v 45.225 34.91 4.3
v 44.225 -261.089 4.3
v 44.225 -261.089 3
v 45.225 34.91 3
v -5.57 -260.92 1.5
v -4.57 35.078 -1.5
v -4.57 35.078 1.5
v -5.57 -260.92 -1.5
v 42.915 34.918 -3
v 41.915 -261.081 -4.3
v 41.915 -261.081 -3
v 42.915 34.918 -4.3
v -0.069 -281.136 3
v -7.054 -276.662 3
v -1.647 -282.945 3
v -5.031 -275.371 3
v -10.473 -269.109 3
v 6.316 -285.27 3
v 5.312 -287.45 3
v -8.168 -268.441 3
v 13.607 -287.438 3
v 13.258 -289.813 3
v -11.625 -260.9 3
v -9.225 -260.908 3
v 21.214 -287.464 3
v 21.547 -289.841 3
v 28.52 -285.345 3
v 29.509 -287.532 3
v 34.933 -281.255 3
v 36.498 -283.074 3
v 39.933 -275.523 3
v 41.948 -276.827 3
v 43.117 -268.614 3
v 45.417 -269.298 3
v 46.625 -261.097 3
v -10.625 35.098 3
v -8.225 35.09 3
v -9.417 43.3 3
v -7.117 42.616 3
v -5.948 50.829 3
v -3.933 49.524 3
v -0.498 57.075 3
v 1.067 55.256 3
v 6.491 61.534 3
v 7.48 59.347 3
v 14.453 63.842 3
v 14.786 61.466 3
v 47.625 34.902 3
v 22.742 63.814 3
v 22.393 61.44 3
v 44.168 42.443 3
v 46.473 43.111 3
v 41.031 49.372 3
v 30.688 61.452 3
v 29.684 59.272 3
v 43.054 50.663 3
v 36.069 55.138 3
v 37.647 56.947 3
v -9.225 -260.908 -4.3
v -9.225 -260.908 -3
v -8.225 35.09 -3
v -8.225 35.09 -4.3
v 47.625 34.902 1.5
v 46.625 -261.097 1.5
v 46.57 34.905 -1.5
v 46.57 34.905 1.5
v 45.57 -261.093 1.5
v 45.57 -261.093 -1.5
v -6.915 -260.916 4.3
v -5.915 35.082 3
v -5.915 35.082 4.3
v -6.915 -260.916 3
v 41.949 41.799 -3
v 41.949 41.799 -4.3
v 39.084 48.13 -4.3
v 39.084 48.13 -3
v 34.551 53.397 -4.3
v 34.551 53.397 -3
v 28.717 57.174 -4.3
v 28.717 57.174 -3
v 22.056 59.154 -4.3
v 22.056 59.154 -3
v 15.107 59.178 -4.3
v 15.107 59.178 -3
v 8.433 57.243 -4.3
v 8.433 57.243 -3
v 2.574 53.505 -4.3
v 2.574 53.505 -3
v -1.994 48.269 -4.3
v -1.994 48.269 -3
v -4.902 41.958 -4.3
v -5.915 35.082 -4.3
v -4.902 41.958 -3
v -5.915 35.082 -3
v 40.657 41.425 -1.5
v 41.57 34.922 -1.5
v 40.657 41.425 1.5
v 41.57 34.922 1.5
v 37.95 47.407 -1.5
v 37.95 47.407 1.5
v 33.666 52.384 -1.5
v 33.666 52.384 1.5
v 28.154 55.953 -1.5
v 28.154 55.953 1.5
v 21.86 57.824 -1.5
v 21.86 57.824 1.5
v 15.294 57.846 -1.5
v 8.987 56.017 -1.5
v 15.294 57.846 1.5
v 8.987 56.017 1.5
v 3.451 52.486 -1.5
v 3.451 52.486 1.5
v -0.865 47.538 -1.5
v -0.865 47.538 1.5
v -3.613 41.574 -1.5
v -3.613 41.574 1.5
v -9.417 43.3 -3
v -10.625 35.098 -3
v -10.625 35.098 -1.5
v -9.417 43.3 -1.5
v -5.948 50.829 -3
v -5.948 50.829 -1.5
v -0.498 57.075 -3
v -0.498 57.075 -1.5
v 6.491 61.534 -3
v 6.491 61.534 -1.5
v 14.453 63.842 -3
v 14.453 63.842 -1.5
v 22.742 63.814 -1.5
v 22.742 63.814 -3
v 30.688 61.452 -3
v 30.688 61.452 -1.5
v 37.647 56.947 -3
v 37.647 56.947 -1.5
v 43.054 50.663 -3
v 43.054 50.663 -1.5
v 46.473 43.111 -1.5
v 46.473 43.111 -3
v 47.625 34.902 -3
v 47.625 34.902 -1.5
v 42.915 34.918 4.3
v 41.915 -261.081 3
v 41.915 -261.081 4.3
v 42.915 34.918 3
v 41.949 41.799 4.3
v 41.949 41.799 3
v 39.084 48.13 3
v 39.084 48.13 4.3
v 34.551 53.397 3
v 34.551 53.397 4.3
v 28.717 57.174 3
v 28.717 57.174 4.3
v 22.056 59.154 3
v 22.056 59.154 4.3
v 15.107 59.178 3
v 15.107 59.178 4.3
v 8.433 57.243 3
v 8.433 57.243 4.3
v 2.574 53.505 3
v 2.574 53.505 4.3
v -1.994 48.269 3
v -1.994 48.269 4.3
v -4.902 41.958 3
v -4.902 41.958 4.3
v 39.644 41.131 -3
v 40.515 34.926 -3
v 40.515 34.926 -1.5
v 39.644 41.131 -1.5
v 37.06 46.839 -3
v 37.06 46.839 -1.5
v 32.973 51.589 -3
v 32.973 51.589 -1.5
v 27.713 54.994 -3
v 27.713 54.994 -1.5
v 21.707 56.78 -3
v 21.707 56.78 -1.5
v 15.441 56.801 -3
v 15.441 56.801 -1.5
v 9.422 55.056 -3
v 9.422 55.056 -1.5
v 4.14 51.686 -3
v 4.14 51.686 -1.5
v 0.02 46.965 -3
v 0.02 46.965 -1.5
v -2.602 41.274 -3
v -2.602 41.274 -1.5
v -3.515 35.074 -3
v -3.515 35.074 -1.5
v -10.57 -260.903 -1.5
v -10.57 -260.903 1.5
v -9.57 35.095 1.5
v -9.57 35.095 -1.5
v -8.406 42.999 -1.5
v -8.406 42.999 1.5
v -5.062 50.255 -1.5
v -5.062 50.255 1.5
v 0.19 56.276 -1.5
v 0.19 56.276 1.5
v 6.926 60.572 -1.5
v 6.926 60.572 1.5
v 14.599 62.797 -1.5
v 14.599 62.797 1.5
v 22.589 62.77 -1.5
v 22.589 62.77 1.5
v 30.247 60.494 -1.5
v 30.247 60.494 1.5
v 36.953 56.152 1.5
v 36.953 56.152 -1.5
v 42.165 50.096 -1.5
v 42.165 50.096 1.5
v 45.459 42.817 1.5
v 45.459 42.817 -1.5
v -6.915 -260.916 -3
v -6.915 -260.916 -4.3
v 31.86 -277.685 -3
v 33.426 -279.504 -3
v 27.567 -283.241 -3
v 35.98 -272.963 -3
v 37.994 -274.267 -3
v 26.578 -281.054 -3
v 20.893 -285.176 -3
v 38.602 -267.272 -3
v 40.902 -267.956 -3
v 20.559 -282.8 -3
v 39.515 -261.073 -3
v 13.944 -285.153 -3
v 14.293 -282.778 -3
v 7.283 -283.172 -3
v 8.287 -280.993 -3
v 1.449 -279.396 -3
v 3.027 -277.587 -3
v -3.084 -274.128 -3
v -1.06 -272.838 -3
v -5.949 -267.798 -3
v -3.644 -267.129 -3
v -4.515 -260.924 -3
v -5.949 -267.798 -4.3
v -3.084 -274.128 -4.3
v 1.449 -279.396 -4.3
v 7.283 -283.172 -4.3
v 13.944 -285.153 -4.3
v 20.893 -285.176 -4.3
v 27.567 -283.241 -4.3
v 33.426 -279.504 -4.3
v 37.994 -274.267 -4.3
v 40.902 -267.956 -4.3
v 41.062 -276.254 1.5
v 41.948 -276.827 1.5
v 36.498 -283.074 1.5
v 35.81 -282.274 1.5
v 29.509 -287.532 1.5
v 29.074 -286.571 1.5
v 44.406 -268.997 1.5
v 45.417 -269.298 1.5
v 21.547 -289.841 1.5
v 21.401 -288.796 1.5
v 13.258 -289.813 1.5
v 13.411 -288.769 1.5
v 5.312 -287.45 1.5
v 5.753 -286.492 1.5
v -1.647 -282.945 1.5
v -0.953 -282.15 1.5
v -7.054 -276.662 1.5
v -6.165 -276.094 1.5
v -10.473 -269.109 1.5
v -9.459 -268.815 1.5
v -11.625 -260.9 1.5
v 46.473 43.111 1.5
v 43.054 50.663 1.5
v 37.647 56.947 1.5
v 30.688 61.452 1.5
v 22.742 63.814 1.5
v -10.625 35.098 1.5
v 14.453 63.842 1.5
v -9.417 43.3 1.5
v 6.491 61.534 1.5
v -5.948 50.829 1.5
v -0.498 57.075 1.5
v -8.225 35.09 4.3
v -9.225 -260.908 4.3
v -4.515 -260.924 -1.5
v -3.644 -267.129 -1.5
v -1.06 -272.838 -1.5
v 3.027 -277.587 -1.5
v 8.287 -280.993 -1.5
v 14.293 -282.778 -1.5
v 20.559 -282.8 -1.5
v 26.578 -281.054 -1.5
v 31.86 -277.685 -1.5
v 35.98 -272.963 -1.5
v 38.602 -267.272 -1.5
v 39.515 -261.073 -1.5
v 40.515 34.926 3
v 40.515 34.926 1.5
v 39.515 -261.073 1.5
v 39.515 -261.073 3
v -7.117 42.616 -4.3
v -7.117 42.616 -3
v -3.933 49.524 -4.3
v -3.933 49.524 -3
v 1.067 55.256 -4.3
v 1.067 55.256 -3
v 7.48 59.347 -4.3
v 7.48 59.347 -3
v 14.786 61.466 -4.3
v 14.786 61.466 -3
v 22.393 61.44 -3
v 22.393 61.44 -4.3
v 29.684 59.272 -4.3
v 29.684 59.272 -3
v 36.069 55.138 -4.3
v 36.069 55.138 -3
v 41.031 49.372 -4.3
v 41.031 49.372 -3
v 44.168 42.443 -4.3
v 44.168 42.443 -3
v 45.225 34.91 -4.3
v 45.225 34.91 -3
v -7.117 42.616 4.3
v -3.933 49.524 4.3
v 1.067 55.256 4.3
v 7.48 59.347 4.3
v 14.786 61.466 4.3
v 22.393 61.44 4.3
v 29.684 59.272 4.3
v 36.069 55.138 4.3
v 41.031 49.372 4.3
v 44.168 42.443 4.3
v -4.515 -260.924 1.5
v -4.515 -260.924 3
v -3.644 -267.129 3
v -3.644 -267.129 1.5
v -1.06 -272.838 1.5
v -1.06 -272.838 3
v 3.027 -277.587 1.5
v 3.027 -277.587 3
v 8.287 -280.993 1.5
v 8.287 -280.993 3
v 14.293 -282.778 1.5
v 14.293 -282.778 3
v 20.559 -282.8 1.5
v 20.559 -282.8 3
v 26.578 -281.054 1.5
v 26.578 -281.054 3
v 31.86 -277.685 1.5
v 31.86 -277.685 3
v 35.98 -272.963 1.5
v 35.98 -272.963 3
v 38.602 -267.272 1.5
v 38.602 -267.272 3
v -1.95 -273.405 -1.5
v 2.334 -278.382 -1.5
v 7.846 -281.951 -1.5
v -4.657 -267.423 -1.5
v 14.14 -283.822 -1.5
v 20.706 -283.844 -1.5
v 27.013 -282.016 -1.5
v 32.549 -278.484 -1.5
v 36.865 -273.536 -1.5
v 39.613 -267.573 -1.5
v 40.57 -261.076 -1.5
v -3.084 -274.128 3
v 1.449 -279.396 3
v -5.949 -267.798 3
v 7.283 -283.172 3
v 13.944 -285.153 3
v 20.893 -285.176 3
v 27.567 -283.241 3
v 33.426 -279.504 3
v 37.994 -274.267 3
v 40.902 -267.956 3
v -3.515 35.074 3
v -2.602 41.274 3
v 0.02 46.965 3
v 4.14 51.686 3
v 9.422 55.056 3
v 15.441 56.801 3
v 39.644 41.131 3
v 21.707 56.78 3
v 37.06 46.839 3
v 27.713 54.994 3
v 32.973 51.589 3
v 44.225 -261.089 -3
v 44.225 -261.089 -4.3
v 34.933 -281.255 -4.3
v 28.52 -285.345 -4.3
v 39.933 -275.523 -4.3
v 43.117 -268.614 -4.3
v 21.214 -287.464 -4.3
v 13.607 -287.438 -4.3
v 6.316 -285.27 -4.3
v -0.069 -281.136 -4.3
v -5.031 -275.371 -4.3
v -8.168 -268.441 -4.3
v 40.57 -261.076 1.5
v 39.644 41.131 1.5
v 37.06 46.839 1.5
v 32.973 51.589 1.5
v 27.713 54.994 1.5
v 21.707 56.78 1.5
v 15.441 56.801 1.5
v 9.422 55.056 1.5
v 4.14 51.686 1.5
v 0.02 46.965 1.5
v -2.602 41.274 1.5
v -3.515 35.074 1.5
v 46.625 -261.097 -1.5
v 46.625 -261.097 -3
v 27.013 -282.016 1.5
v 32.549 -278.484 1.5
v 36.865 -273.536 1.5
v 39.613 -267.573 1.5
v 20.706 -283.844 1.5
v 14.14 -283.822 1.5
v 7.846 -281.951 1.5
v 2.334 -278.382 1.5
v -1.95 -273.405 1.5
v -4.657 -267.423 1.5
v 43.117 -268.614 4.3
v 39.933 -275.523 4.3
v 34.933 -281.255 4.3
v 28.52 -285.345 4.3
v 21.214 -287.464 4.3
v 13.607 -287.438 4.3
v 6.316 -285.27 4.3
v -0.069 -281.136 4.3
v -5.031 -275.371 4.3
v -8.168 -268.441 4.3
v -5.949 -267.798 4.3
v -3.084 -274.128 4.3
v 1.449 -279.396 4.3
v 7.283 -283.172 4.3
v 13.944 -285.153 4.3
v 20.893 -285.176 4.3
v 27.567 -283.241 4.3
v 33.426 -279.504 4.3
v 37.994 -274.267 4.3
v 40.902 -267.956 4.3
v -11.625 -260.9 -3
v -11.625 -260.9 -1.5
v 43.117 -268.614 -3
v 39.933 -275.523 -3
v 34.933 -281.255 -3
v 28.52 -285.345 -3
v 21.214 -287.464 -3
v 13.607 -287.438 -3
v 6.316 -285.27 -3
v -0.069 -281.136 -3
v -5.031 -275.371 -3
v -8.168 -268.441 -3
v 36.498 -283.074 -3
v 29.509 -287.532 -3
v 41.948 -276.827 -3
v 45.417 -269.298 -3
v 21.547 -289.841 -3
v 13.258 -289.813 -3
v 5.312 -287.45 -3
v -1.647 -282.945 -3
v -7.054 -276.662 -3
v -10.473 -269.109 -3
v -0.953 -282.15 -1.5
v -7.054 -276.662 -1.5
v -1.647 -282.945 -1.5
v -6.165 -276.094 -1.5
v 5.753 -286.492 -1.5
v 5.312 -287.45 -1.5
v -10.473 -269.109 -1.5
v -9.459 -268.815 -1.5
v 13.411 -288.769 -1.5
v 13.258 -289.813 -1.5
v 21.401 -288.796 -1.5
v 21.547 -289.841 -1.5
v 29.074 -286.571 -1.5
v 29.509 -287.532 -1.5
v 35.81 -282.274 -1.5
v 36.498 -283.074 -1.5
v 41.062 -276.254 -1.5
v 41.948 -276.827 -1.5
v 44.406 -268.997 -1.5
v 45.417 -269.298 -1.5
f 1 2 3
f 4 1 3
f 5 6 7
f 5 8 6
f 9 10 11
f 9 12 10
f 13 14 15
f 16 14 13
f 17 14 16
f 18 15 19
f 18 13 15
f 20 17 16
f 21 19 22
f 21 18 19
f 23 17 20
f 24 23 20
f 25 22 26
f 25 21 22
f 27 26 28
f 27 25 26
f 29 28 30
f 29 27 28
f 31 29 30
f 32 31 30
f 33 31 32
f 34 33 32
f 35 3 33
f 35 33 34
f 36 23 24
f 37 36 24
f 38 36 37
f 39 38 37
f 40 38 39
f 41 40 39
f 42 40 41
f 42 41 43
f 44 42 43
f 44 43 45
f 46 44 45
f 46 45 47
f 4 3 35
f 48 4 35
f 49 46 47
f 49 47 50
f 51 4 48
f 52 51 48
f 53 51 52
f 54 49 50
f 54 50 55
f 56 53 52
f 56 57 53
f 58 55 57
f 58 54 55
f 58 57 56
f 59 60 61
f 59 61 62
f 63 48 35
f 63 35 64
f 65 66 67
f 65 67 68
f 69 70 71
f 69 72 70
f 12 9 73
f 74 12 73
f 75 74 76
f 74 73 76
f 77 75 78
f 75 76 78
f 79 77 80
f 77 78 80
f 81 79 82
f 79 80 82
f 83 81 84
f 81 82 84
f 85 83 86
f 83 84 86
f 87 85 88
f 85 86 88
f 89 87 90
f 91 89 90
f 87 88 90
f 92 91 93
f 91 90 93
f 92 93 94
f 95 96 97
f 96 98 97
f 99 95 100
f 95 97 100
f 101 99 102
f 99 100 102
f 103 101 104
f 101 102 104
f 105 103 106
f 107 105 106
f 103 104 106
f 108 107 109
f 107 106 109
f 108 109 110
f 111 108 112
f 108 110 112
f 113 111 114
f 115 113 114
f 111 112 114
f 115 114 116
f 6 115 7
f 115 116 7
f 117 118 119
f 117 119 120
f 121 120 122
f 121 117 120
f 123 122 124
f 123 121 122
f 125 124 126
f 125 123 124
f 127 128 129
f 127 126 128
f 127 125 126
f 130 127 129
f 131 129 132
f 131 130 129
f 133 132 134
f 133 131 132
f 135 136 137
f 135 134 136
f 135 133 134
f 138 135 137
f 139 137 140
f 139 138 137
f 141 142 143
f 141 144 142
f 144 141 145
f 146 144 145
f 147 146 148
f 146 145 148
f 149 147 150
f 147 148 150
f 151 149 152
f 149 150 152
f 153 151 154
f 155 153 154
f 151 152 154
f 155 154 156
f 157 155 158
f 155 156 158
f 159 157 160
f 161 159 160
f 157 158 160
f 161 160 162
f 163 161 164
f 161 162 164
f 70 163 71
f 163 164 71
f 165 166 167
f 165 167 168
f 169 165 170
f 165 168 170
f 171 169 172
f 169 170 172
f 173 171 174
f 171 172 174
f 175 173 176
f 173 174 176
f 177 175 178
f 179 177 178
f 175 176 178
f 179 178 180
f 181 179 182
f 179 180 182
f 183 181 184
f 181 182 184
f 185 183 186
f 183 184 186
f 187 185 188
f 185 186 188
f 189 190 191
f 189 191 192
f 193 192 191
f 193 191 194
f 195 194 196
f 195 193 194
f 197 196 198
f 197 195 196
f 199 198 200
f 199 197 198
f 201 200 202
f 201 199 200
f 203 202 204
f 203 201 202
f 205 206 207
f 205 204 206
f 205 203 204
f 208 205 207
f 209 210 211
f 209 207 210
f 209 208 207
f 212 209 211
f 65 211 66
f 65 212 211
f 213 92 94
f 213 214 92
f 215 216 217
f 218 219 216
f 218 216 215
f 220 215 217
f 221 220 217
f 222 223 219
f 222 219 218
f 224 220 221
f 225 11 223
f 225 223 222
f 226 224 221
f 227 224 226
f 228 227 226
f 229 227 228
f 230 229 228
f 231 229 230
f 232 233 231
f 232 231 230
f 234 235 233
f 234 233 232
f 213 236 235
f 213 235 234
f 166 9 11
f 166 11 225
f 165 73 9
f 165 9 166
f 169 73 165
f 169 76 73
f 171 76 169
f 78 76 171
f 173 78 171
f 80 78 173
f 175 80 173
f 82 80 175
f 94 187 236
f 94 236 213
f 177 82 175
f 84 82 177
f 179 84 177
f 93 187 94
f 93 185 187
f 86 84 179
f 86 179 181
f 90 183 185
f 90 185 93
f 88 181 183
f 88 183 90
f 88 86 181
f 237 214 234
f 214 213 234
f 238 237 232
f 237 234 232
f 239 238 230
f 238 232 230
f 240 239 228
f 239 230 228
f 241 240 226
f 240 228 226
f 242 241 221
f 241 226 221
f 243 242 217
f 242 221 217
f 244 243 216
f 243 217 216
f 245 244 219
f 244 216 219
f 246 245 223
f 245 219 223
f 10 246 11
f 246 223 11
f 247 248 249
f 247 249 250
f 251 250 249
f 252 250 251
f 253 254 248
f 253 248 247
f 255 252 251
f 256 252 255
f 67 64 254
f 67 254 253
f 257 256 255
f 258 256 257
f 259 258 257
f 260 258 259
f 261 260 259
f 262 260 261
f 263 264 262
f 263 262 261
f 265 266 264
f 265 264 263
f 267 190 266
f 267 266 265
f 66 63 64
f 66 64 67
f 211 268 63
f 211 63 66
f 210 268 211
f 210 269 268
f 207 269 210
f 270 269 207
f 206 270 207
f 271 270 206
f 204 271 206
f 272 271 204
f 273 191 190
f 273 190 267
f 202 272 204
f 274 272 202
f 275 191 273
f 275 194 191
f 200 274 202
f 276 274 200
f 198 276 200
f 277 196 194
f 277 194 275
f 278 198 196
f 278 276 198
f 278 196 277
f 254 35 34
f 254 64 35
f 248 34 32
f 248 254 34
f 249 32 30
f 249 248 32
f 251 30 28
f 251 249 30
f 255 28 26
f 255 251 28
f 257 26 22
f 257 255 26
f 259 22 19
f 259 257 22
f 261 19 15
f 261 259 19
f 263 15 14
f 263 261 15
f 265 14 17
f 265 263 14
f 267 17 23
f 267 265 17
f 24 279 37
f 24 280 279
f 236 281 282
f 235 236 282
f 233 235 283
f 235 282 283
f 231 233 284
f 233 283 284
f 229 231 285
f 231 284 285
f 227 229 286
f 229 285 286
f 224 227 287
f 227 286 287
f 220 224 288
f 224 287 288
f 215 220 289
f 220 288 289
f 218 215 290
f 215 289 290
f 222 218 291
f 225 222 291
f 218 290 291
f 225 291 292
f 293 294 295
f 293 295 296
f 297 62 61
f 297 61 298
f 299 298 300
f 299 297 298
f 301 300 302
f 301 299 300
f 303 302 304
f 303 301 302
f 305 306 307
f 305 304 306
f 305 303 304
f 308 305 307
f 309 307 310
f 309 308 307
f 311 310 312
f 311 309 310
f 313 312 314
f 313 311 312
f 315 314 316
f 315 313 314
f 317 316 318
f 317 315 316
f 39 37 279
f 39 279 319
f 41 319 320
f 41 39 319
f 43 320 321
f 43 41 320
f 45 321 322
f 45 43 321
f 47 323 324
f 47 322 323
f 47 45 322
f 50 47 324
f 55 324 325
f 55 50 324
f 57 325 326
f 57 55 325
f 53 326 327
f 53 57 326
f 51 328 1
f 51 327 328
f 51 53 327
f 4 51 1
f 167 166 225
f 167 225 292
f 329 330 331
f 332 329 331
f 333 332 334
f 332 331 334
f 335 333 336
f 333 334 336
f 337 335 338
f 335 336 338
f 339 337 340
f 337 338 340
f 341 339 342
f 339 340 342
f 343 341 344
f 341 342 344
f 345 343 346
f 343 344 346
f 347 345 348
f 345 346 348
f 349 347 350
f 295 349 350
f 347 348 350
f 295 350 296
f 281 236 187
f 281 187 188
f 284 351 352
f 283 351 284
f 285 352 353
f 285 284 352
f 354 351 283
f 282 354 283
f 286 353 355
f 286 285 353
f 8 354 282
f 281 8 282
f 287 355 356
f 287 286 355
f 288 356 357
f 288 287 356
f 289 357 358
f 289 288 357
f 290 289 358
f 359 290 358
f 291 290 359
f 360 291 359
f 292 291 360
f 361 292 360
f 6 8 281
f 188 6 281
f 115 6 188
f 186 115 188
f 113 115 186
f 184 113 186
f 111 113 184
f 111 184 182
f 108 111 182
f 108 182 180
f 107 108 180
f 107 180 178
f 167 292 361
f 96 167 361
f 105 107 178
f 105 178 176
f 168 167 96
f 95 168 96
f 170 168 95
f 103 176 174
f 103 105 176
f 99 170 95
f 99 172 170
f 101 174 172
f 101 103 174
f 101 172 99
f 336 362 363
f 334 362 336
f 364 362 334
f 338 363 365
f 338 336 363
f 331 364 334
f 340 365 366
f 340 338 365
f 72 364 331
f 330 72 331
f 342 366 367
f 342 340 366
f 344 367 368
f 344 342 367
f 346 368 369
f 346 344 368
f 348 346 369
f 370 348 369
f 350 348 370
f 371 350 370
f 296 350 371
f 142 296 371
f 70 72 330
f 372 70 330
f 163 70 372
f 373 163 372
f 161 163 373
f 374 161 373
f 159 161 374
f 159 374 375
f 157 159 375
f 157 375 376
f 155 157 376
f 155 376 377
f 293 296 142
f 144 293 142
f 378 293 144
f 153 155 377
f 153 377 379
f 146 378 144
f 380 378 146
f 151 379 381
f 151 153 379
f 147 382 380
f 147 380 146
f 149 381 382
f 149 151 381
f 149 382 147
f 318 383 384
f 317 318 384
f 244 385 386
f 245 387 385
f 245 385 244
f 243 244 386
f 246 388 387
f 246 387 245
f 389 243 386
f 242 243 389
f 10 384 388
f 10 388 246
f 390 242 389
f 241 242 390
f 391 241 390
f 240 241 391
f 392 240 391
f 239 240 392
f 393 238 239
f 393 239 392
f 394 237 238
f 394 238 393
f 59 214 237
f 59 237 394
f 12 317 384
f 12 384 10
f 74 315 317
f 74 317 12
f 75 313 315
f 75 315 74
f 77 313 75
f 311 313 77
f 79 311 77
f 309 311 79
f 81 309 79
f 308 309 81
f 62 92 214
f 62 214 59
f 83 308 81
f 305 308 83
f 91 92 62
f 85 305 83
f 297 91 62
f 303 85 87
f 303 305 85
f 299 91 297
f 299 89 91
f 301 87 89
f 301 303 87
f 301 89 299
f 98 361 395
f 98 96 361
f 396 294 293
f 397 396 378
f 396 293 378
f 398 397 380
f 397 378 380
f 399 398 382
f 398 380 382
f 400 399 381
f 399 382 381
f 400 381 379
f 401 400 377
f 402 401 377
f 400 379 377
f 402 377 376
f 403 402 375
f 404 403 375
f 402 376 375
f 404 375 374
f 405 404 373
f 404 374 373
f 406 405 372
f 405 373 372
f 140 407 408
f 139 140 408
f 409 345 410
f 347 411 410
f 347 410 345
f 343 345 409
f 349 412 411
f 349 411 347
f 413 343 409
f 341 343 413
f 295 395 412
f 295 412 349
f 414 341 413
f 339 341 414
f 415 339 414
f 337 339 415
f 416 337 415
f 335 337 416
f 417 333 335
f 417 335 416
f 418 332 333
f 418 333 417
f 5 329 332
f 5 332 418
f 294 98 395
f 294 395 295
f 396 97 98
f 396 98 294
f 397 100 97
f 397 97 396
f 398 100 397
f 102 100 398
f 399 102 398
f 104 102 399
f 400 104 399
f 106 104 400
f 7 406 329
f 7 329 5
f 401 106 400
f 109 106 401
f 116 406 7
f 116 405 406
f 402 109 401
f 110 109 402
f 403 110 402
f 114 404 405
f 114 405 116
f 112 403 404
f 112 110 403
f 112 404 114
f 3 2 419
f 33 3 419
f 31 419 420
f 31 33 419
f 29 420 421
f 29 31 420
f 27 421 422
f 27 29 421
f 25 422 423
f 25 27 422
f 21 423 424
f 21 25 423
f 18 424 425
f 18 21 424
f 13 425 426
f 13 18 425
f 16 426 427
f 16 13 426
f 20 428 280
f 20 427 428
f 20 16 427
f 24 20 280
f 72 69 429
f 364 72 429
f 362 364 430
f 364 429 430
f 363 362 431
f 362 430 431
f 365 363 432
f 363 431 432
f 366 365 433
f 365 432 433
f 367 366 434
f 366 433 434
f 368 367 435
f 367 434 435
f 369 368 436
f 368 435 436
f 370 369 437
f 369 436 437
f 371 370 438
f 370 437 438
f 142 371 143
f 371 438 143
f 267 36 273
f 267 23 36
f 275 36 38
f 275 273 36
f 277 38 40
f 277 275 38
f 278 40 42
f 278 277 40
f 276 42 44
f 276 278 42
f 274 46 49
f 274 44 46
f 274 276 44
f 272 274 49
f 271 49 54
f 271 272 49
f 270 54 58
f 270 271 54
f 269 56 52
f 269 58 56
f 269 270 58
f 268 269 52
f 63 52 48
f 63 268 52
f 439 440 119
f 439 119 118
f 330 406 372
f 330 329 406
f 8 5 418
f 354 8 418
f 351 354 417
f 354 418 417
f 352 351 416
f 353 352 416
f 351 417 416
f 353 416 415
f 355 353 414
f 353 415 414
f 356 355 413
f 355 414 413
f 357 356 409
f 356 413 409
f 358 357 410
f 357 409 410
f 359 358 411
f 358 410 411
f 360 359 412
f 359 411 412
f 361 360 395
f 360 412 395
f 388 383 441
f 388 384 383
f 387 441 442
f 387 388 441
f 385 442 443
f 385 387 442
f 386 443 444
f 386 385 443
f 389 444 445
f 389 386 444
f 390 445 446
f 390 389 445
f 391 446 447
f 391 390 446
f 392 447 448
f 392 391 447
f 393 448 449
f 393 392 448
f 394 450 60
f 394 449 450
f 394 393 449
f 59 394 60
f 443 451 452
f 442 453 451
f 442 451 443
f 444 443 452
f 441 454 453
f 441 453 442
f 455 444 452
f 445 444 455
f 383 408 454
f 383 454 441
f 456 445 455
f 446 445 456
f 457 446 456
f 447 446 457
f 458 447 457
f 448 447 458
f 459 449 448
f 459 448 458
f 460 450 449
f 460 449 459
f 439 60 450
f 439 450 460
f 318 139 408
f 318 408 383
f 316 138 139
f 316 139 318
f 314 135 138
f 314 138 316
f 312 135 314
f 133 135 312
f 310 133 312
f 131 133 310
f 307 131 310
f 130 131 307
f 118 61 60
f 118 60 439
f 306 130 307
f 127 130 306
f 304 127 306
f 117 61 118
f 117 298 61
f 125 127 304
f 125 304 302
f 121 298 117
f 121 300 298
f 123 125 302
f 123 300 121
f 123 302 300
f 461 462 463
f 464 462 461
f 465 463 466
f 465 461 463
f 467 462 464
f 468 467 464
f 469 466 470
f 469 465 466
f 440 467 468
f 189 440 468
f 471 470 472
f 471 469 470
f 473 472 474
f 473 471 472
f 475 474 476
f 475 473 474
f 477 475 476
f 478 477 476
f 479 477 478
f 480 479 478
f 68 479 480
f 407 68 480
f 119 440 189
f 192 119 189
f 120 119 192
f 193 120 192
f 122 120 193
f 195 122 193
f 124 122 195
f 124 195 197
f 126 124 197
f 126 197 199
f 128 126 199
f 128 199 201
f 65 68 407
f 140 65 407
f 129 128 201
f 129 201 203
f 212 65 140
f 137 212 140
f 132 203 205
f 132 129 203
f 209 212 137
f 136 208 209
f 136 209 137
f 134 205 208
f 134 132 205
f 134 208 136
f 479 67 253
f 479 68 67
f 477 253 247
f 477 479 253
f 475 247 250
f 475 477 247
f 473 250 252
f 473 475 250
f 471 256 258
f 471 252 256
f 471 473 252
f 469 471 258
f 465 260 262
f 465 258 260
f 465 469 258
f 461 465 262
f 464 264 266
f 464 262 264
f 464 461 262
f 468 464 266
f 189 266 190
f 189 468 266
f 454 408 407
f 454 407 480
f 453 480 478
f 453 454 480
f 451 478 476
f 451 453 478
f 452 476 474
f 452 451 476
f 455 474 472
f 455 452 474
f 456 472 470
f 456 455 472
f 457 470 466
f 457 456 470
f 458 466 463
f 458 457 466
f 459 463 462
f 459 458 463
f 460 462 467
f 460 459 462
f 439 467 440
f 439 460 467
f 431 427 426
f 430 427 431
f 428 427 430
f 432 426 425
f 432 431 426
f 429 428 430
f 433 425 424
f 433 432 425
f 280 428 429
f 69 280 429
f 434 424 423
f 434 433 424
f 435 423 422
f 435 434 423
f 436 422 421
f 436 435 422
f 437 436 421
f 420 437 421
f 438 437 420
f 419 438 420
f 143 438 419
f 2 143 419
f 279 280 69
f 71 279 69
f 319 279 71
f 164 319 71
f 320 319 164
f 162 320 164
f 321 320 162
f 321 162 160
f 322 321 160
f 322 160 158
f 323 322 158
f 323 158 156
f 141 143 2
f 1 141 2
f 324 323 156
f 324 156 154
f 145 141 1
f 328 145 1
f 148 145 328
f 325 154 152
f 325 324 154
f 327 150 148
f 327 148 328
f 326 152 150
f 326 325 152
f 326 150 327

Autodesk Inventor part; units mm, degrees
ref_plane "Work Plane2" through (18.5, 35, 0) normal (-1, 0, 0) x (0, 0, 1)
ref_plane "Work Plane3" through (17.5, -260.9983, 0) normal (0.309017, 0.9510565, 0) x (0, 0, 1)
sketch "Path" plane through (0, 0, 0) normal (0, 0, 1) x (1, 0, 0)
  arc A0 (44.0697, 34.9136) -> (-7.0697, 35.0864) centre (18.5, 35) ccw
  arc A1 (-8.0697, -260.9119) -> (43.0697, -261.0847) centre (17.5, -260.9983) ccw
  line L0 (-8.0697, -260.9119) -> (-7.0697, 35.0864)
  line L1 (44.0697, 34.9136) -> (43.0697, -261.0847)
ref_plane "Section Plane" through (-7.0697, 35.0864, 0) normal (-0.0033784, -0.9999943, 0) x (0, 0, 1)
sketch "Section Sketch" plane through (-7.0697, 35.0864, 0) normal (-0.0033784, -0.9999943, 0) x (0, 0, 1)
  line L0 (-4.3, -1.155) -> (4.3, -1.155)
  line L1 (4.3, -1.155) -> (4.3, 1.155)
  line L2 (4.3, 1.155) -> (-4.3, 1.155)
  line L3 (-4.3, 1.155) -> (-4.3, -1.155)
  line L4 (-1.5, -2.5) -> (1.5, -2.5)
  line L5 (1.5, -2.5) -> (1.5, 2.5)
  line L6 (1.5, 2.5) -> (-1.5, 2.5)
  line L7 (-1.5, 2.5) -> (-1.5, -2.5)
  line L8 (-1.5, 0) -> (1.5, 0) construction
  line L9 (-3, -3.555) -> (-1.5, -3.555)
  line L10 (-1.5, -3.555) -> (-1.5, 3.555)
  line L11 (-1.5, 3.555) -> (-3, 3.555)
  line L12 (-3, 3.555) -> (-3, -3.555)
  line L13 (1.5, -3.555) -> (3, -3.555)
  line L14 (3, -3.555) -> (3, 3.555)
  line L15 (3, 3.555) -> (1.5, 3.555)
  line L16 (1.5, 3.555) -> (1.5, -3.555)
  line L17 (-4.3, 0) -> (4.3, 0) construction
  point P0 (0, 0)
  point P1 (0, 0)
  dimension "d21" = 2.31
  dimension "d22" = 5
  dimension "d23" = 3
  dimension "d24" = 1.5
  dimension "d31" = 7.11
  dimension "d32" = 8.6
sweep "Solid" add profiles "Section Sketch" path "Path"
pattern_of_one "Strand Pattern"
equation "\"d21\" = da_d2"
equation "\"d22\" = da_d1"
equation "\"d23\" = da_b1"
equation "\"d24\" = da_t1 + da_t2"
equation "\"d30\" = da_pt"
equation "\"da_p\" = 8"
equation "\"da_b1\" = 3"
equation "\"da_h2\" = 7.11"
equation "\"da_h3\" = 7.11"
equation "\"da_d1\" = 5"
equation "\"da_d2\" = 2.31"
equation "\"da_pt\" = 5.64"
equation "\"da_b\" = 8.6"
equation "\"da_t1\" = 0.75"
equation "\"da_t2\" = 0.75"
properties part number "Roller Chain"
